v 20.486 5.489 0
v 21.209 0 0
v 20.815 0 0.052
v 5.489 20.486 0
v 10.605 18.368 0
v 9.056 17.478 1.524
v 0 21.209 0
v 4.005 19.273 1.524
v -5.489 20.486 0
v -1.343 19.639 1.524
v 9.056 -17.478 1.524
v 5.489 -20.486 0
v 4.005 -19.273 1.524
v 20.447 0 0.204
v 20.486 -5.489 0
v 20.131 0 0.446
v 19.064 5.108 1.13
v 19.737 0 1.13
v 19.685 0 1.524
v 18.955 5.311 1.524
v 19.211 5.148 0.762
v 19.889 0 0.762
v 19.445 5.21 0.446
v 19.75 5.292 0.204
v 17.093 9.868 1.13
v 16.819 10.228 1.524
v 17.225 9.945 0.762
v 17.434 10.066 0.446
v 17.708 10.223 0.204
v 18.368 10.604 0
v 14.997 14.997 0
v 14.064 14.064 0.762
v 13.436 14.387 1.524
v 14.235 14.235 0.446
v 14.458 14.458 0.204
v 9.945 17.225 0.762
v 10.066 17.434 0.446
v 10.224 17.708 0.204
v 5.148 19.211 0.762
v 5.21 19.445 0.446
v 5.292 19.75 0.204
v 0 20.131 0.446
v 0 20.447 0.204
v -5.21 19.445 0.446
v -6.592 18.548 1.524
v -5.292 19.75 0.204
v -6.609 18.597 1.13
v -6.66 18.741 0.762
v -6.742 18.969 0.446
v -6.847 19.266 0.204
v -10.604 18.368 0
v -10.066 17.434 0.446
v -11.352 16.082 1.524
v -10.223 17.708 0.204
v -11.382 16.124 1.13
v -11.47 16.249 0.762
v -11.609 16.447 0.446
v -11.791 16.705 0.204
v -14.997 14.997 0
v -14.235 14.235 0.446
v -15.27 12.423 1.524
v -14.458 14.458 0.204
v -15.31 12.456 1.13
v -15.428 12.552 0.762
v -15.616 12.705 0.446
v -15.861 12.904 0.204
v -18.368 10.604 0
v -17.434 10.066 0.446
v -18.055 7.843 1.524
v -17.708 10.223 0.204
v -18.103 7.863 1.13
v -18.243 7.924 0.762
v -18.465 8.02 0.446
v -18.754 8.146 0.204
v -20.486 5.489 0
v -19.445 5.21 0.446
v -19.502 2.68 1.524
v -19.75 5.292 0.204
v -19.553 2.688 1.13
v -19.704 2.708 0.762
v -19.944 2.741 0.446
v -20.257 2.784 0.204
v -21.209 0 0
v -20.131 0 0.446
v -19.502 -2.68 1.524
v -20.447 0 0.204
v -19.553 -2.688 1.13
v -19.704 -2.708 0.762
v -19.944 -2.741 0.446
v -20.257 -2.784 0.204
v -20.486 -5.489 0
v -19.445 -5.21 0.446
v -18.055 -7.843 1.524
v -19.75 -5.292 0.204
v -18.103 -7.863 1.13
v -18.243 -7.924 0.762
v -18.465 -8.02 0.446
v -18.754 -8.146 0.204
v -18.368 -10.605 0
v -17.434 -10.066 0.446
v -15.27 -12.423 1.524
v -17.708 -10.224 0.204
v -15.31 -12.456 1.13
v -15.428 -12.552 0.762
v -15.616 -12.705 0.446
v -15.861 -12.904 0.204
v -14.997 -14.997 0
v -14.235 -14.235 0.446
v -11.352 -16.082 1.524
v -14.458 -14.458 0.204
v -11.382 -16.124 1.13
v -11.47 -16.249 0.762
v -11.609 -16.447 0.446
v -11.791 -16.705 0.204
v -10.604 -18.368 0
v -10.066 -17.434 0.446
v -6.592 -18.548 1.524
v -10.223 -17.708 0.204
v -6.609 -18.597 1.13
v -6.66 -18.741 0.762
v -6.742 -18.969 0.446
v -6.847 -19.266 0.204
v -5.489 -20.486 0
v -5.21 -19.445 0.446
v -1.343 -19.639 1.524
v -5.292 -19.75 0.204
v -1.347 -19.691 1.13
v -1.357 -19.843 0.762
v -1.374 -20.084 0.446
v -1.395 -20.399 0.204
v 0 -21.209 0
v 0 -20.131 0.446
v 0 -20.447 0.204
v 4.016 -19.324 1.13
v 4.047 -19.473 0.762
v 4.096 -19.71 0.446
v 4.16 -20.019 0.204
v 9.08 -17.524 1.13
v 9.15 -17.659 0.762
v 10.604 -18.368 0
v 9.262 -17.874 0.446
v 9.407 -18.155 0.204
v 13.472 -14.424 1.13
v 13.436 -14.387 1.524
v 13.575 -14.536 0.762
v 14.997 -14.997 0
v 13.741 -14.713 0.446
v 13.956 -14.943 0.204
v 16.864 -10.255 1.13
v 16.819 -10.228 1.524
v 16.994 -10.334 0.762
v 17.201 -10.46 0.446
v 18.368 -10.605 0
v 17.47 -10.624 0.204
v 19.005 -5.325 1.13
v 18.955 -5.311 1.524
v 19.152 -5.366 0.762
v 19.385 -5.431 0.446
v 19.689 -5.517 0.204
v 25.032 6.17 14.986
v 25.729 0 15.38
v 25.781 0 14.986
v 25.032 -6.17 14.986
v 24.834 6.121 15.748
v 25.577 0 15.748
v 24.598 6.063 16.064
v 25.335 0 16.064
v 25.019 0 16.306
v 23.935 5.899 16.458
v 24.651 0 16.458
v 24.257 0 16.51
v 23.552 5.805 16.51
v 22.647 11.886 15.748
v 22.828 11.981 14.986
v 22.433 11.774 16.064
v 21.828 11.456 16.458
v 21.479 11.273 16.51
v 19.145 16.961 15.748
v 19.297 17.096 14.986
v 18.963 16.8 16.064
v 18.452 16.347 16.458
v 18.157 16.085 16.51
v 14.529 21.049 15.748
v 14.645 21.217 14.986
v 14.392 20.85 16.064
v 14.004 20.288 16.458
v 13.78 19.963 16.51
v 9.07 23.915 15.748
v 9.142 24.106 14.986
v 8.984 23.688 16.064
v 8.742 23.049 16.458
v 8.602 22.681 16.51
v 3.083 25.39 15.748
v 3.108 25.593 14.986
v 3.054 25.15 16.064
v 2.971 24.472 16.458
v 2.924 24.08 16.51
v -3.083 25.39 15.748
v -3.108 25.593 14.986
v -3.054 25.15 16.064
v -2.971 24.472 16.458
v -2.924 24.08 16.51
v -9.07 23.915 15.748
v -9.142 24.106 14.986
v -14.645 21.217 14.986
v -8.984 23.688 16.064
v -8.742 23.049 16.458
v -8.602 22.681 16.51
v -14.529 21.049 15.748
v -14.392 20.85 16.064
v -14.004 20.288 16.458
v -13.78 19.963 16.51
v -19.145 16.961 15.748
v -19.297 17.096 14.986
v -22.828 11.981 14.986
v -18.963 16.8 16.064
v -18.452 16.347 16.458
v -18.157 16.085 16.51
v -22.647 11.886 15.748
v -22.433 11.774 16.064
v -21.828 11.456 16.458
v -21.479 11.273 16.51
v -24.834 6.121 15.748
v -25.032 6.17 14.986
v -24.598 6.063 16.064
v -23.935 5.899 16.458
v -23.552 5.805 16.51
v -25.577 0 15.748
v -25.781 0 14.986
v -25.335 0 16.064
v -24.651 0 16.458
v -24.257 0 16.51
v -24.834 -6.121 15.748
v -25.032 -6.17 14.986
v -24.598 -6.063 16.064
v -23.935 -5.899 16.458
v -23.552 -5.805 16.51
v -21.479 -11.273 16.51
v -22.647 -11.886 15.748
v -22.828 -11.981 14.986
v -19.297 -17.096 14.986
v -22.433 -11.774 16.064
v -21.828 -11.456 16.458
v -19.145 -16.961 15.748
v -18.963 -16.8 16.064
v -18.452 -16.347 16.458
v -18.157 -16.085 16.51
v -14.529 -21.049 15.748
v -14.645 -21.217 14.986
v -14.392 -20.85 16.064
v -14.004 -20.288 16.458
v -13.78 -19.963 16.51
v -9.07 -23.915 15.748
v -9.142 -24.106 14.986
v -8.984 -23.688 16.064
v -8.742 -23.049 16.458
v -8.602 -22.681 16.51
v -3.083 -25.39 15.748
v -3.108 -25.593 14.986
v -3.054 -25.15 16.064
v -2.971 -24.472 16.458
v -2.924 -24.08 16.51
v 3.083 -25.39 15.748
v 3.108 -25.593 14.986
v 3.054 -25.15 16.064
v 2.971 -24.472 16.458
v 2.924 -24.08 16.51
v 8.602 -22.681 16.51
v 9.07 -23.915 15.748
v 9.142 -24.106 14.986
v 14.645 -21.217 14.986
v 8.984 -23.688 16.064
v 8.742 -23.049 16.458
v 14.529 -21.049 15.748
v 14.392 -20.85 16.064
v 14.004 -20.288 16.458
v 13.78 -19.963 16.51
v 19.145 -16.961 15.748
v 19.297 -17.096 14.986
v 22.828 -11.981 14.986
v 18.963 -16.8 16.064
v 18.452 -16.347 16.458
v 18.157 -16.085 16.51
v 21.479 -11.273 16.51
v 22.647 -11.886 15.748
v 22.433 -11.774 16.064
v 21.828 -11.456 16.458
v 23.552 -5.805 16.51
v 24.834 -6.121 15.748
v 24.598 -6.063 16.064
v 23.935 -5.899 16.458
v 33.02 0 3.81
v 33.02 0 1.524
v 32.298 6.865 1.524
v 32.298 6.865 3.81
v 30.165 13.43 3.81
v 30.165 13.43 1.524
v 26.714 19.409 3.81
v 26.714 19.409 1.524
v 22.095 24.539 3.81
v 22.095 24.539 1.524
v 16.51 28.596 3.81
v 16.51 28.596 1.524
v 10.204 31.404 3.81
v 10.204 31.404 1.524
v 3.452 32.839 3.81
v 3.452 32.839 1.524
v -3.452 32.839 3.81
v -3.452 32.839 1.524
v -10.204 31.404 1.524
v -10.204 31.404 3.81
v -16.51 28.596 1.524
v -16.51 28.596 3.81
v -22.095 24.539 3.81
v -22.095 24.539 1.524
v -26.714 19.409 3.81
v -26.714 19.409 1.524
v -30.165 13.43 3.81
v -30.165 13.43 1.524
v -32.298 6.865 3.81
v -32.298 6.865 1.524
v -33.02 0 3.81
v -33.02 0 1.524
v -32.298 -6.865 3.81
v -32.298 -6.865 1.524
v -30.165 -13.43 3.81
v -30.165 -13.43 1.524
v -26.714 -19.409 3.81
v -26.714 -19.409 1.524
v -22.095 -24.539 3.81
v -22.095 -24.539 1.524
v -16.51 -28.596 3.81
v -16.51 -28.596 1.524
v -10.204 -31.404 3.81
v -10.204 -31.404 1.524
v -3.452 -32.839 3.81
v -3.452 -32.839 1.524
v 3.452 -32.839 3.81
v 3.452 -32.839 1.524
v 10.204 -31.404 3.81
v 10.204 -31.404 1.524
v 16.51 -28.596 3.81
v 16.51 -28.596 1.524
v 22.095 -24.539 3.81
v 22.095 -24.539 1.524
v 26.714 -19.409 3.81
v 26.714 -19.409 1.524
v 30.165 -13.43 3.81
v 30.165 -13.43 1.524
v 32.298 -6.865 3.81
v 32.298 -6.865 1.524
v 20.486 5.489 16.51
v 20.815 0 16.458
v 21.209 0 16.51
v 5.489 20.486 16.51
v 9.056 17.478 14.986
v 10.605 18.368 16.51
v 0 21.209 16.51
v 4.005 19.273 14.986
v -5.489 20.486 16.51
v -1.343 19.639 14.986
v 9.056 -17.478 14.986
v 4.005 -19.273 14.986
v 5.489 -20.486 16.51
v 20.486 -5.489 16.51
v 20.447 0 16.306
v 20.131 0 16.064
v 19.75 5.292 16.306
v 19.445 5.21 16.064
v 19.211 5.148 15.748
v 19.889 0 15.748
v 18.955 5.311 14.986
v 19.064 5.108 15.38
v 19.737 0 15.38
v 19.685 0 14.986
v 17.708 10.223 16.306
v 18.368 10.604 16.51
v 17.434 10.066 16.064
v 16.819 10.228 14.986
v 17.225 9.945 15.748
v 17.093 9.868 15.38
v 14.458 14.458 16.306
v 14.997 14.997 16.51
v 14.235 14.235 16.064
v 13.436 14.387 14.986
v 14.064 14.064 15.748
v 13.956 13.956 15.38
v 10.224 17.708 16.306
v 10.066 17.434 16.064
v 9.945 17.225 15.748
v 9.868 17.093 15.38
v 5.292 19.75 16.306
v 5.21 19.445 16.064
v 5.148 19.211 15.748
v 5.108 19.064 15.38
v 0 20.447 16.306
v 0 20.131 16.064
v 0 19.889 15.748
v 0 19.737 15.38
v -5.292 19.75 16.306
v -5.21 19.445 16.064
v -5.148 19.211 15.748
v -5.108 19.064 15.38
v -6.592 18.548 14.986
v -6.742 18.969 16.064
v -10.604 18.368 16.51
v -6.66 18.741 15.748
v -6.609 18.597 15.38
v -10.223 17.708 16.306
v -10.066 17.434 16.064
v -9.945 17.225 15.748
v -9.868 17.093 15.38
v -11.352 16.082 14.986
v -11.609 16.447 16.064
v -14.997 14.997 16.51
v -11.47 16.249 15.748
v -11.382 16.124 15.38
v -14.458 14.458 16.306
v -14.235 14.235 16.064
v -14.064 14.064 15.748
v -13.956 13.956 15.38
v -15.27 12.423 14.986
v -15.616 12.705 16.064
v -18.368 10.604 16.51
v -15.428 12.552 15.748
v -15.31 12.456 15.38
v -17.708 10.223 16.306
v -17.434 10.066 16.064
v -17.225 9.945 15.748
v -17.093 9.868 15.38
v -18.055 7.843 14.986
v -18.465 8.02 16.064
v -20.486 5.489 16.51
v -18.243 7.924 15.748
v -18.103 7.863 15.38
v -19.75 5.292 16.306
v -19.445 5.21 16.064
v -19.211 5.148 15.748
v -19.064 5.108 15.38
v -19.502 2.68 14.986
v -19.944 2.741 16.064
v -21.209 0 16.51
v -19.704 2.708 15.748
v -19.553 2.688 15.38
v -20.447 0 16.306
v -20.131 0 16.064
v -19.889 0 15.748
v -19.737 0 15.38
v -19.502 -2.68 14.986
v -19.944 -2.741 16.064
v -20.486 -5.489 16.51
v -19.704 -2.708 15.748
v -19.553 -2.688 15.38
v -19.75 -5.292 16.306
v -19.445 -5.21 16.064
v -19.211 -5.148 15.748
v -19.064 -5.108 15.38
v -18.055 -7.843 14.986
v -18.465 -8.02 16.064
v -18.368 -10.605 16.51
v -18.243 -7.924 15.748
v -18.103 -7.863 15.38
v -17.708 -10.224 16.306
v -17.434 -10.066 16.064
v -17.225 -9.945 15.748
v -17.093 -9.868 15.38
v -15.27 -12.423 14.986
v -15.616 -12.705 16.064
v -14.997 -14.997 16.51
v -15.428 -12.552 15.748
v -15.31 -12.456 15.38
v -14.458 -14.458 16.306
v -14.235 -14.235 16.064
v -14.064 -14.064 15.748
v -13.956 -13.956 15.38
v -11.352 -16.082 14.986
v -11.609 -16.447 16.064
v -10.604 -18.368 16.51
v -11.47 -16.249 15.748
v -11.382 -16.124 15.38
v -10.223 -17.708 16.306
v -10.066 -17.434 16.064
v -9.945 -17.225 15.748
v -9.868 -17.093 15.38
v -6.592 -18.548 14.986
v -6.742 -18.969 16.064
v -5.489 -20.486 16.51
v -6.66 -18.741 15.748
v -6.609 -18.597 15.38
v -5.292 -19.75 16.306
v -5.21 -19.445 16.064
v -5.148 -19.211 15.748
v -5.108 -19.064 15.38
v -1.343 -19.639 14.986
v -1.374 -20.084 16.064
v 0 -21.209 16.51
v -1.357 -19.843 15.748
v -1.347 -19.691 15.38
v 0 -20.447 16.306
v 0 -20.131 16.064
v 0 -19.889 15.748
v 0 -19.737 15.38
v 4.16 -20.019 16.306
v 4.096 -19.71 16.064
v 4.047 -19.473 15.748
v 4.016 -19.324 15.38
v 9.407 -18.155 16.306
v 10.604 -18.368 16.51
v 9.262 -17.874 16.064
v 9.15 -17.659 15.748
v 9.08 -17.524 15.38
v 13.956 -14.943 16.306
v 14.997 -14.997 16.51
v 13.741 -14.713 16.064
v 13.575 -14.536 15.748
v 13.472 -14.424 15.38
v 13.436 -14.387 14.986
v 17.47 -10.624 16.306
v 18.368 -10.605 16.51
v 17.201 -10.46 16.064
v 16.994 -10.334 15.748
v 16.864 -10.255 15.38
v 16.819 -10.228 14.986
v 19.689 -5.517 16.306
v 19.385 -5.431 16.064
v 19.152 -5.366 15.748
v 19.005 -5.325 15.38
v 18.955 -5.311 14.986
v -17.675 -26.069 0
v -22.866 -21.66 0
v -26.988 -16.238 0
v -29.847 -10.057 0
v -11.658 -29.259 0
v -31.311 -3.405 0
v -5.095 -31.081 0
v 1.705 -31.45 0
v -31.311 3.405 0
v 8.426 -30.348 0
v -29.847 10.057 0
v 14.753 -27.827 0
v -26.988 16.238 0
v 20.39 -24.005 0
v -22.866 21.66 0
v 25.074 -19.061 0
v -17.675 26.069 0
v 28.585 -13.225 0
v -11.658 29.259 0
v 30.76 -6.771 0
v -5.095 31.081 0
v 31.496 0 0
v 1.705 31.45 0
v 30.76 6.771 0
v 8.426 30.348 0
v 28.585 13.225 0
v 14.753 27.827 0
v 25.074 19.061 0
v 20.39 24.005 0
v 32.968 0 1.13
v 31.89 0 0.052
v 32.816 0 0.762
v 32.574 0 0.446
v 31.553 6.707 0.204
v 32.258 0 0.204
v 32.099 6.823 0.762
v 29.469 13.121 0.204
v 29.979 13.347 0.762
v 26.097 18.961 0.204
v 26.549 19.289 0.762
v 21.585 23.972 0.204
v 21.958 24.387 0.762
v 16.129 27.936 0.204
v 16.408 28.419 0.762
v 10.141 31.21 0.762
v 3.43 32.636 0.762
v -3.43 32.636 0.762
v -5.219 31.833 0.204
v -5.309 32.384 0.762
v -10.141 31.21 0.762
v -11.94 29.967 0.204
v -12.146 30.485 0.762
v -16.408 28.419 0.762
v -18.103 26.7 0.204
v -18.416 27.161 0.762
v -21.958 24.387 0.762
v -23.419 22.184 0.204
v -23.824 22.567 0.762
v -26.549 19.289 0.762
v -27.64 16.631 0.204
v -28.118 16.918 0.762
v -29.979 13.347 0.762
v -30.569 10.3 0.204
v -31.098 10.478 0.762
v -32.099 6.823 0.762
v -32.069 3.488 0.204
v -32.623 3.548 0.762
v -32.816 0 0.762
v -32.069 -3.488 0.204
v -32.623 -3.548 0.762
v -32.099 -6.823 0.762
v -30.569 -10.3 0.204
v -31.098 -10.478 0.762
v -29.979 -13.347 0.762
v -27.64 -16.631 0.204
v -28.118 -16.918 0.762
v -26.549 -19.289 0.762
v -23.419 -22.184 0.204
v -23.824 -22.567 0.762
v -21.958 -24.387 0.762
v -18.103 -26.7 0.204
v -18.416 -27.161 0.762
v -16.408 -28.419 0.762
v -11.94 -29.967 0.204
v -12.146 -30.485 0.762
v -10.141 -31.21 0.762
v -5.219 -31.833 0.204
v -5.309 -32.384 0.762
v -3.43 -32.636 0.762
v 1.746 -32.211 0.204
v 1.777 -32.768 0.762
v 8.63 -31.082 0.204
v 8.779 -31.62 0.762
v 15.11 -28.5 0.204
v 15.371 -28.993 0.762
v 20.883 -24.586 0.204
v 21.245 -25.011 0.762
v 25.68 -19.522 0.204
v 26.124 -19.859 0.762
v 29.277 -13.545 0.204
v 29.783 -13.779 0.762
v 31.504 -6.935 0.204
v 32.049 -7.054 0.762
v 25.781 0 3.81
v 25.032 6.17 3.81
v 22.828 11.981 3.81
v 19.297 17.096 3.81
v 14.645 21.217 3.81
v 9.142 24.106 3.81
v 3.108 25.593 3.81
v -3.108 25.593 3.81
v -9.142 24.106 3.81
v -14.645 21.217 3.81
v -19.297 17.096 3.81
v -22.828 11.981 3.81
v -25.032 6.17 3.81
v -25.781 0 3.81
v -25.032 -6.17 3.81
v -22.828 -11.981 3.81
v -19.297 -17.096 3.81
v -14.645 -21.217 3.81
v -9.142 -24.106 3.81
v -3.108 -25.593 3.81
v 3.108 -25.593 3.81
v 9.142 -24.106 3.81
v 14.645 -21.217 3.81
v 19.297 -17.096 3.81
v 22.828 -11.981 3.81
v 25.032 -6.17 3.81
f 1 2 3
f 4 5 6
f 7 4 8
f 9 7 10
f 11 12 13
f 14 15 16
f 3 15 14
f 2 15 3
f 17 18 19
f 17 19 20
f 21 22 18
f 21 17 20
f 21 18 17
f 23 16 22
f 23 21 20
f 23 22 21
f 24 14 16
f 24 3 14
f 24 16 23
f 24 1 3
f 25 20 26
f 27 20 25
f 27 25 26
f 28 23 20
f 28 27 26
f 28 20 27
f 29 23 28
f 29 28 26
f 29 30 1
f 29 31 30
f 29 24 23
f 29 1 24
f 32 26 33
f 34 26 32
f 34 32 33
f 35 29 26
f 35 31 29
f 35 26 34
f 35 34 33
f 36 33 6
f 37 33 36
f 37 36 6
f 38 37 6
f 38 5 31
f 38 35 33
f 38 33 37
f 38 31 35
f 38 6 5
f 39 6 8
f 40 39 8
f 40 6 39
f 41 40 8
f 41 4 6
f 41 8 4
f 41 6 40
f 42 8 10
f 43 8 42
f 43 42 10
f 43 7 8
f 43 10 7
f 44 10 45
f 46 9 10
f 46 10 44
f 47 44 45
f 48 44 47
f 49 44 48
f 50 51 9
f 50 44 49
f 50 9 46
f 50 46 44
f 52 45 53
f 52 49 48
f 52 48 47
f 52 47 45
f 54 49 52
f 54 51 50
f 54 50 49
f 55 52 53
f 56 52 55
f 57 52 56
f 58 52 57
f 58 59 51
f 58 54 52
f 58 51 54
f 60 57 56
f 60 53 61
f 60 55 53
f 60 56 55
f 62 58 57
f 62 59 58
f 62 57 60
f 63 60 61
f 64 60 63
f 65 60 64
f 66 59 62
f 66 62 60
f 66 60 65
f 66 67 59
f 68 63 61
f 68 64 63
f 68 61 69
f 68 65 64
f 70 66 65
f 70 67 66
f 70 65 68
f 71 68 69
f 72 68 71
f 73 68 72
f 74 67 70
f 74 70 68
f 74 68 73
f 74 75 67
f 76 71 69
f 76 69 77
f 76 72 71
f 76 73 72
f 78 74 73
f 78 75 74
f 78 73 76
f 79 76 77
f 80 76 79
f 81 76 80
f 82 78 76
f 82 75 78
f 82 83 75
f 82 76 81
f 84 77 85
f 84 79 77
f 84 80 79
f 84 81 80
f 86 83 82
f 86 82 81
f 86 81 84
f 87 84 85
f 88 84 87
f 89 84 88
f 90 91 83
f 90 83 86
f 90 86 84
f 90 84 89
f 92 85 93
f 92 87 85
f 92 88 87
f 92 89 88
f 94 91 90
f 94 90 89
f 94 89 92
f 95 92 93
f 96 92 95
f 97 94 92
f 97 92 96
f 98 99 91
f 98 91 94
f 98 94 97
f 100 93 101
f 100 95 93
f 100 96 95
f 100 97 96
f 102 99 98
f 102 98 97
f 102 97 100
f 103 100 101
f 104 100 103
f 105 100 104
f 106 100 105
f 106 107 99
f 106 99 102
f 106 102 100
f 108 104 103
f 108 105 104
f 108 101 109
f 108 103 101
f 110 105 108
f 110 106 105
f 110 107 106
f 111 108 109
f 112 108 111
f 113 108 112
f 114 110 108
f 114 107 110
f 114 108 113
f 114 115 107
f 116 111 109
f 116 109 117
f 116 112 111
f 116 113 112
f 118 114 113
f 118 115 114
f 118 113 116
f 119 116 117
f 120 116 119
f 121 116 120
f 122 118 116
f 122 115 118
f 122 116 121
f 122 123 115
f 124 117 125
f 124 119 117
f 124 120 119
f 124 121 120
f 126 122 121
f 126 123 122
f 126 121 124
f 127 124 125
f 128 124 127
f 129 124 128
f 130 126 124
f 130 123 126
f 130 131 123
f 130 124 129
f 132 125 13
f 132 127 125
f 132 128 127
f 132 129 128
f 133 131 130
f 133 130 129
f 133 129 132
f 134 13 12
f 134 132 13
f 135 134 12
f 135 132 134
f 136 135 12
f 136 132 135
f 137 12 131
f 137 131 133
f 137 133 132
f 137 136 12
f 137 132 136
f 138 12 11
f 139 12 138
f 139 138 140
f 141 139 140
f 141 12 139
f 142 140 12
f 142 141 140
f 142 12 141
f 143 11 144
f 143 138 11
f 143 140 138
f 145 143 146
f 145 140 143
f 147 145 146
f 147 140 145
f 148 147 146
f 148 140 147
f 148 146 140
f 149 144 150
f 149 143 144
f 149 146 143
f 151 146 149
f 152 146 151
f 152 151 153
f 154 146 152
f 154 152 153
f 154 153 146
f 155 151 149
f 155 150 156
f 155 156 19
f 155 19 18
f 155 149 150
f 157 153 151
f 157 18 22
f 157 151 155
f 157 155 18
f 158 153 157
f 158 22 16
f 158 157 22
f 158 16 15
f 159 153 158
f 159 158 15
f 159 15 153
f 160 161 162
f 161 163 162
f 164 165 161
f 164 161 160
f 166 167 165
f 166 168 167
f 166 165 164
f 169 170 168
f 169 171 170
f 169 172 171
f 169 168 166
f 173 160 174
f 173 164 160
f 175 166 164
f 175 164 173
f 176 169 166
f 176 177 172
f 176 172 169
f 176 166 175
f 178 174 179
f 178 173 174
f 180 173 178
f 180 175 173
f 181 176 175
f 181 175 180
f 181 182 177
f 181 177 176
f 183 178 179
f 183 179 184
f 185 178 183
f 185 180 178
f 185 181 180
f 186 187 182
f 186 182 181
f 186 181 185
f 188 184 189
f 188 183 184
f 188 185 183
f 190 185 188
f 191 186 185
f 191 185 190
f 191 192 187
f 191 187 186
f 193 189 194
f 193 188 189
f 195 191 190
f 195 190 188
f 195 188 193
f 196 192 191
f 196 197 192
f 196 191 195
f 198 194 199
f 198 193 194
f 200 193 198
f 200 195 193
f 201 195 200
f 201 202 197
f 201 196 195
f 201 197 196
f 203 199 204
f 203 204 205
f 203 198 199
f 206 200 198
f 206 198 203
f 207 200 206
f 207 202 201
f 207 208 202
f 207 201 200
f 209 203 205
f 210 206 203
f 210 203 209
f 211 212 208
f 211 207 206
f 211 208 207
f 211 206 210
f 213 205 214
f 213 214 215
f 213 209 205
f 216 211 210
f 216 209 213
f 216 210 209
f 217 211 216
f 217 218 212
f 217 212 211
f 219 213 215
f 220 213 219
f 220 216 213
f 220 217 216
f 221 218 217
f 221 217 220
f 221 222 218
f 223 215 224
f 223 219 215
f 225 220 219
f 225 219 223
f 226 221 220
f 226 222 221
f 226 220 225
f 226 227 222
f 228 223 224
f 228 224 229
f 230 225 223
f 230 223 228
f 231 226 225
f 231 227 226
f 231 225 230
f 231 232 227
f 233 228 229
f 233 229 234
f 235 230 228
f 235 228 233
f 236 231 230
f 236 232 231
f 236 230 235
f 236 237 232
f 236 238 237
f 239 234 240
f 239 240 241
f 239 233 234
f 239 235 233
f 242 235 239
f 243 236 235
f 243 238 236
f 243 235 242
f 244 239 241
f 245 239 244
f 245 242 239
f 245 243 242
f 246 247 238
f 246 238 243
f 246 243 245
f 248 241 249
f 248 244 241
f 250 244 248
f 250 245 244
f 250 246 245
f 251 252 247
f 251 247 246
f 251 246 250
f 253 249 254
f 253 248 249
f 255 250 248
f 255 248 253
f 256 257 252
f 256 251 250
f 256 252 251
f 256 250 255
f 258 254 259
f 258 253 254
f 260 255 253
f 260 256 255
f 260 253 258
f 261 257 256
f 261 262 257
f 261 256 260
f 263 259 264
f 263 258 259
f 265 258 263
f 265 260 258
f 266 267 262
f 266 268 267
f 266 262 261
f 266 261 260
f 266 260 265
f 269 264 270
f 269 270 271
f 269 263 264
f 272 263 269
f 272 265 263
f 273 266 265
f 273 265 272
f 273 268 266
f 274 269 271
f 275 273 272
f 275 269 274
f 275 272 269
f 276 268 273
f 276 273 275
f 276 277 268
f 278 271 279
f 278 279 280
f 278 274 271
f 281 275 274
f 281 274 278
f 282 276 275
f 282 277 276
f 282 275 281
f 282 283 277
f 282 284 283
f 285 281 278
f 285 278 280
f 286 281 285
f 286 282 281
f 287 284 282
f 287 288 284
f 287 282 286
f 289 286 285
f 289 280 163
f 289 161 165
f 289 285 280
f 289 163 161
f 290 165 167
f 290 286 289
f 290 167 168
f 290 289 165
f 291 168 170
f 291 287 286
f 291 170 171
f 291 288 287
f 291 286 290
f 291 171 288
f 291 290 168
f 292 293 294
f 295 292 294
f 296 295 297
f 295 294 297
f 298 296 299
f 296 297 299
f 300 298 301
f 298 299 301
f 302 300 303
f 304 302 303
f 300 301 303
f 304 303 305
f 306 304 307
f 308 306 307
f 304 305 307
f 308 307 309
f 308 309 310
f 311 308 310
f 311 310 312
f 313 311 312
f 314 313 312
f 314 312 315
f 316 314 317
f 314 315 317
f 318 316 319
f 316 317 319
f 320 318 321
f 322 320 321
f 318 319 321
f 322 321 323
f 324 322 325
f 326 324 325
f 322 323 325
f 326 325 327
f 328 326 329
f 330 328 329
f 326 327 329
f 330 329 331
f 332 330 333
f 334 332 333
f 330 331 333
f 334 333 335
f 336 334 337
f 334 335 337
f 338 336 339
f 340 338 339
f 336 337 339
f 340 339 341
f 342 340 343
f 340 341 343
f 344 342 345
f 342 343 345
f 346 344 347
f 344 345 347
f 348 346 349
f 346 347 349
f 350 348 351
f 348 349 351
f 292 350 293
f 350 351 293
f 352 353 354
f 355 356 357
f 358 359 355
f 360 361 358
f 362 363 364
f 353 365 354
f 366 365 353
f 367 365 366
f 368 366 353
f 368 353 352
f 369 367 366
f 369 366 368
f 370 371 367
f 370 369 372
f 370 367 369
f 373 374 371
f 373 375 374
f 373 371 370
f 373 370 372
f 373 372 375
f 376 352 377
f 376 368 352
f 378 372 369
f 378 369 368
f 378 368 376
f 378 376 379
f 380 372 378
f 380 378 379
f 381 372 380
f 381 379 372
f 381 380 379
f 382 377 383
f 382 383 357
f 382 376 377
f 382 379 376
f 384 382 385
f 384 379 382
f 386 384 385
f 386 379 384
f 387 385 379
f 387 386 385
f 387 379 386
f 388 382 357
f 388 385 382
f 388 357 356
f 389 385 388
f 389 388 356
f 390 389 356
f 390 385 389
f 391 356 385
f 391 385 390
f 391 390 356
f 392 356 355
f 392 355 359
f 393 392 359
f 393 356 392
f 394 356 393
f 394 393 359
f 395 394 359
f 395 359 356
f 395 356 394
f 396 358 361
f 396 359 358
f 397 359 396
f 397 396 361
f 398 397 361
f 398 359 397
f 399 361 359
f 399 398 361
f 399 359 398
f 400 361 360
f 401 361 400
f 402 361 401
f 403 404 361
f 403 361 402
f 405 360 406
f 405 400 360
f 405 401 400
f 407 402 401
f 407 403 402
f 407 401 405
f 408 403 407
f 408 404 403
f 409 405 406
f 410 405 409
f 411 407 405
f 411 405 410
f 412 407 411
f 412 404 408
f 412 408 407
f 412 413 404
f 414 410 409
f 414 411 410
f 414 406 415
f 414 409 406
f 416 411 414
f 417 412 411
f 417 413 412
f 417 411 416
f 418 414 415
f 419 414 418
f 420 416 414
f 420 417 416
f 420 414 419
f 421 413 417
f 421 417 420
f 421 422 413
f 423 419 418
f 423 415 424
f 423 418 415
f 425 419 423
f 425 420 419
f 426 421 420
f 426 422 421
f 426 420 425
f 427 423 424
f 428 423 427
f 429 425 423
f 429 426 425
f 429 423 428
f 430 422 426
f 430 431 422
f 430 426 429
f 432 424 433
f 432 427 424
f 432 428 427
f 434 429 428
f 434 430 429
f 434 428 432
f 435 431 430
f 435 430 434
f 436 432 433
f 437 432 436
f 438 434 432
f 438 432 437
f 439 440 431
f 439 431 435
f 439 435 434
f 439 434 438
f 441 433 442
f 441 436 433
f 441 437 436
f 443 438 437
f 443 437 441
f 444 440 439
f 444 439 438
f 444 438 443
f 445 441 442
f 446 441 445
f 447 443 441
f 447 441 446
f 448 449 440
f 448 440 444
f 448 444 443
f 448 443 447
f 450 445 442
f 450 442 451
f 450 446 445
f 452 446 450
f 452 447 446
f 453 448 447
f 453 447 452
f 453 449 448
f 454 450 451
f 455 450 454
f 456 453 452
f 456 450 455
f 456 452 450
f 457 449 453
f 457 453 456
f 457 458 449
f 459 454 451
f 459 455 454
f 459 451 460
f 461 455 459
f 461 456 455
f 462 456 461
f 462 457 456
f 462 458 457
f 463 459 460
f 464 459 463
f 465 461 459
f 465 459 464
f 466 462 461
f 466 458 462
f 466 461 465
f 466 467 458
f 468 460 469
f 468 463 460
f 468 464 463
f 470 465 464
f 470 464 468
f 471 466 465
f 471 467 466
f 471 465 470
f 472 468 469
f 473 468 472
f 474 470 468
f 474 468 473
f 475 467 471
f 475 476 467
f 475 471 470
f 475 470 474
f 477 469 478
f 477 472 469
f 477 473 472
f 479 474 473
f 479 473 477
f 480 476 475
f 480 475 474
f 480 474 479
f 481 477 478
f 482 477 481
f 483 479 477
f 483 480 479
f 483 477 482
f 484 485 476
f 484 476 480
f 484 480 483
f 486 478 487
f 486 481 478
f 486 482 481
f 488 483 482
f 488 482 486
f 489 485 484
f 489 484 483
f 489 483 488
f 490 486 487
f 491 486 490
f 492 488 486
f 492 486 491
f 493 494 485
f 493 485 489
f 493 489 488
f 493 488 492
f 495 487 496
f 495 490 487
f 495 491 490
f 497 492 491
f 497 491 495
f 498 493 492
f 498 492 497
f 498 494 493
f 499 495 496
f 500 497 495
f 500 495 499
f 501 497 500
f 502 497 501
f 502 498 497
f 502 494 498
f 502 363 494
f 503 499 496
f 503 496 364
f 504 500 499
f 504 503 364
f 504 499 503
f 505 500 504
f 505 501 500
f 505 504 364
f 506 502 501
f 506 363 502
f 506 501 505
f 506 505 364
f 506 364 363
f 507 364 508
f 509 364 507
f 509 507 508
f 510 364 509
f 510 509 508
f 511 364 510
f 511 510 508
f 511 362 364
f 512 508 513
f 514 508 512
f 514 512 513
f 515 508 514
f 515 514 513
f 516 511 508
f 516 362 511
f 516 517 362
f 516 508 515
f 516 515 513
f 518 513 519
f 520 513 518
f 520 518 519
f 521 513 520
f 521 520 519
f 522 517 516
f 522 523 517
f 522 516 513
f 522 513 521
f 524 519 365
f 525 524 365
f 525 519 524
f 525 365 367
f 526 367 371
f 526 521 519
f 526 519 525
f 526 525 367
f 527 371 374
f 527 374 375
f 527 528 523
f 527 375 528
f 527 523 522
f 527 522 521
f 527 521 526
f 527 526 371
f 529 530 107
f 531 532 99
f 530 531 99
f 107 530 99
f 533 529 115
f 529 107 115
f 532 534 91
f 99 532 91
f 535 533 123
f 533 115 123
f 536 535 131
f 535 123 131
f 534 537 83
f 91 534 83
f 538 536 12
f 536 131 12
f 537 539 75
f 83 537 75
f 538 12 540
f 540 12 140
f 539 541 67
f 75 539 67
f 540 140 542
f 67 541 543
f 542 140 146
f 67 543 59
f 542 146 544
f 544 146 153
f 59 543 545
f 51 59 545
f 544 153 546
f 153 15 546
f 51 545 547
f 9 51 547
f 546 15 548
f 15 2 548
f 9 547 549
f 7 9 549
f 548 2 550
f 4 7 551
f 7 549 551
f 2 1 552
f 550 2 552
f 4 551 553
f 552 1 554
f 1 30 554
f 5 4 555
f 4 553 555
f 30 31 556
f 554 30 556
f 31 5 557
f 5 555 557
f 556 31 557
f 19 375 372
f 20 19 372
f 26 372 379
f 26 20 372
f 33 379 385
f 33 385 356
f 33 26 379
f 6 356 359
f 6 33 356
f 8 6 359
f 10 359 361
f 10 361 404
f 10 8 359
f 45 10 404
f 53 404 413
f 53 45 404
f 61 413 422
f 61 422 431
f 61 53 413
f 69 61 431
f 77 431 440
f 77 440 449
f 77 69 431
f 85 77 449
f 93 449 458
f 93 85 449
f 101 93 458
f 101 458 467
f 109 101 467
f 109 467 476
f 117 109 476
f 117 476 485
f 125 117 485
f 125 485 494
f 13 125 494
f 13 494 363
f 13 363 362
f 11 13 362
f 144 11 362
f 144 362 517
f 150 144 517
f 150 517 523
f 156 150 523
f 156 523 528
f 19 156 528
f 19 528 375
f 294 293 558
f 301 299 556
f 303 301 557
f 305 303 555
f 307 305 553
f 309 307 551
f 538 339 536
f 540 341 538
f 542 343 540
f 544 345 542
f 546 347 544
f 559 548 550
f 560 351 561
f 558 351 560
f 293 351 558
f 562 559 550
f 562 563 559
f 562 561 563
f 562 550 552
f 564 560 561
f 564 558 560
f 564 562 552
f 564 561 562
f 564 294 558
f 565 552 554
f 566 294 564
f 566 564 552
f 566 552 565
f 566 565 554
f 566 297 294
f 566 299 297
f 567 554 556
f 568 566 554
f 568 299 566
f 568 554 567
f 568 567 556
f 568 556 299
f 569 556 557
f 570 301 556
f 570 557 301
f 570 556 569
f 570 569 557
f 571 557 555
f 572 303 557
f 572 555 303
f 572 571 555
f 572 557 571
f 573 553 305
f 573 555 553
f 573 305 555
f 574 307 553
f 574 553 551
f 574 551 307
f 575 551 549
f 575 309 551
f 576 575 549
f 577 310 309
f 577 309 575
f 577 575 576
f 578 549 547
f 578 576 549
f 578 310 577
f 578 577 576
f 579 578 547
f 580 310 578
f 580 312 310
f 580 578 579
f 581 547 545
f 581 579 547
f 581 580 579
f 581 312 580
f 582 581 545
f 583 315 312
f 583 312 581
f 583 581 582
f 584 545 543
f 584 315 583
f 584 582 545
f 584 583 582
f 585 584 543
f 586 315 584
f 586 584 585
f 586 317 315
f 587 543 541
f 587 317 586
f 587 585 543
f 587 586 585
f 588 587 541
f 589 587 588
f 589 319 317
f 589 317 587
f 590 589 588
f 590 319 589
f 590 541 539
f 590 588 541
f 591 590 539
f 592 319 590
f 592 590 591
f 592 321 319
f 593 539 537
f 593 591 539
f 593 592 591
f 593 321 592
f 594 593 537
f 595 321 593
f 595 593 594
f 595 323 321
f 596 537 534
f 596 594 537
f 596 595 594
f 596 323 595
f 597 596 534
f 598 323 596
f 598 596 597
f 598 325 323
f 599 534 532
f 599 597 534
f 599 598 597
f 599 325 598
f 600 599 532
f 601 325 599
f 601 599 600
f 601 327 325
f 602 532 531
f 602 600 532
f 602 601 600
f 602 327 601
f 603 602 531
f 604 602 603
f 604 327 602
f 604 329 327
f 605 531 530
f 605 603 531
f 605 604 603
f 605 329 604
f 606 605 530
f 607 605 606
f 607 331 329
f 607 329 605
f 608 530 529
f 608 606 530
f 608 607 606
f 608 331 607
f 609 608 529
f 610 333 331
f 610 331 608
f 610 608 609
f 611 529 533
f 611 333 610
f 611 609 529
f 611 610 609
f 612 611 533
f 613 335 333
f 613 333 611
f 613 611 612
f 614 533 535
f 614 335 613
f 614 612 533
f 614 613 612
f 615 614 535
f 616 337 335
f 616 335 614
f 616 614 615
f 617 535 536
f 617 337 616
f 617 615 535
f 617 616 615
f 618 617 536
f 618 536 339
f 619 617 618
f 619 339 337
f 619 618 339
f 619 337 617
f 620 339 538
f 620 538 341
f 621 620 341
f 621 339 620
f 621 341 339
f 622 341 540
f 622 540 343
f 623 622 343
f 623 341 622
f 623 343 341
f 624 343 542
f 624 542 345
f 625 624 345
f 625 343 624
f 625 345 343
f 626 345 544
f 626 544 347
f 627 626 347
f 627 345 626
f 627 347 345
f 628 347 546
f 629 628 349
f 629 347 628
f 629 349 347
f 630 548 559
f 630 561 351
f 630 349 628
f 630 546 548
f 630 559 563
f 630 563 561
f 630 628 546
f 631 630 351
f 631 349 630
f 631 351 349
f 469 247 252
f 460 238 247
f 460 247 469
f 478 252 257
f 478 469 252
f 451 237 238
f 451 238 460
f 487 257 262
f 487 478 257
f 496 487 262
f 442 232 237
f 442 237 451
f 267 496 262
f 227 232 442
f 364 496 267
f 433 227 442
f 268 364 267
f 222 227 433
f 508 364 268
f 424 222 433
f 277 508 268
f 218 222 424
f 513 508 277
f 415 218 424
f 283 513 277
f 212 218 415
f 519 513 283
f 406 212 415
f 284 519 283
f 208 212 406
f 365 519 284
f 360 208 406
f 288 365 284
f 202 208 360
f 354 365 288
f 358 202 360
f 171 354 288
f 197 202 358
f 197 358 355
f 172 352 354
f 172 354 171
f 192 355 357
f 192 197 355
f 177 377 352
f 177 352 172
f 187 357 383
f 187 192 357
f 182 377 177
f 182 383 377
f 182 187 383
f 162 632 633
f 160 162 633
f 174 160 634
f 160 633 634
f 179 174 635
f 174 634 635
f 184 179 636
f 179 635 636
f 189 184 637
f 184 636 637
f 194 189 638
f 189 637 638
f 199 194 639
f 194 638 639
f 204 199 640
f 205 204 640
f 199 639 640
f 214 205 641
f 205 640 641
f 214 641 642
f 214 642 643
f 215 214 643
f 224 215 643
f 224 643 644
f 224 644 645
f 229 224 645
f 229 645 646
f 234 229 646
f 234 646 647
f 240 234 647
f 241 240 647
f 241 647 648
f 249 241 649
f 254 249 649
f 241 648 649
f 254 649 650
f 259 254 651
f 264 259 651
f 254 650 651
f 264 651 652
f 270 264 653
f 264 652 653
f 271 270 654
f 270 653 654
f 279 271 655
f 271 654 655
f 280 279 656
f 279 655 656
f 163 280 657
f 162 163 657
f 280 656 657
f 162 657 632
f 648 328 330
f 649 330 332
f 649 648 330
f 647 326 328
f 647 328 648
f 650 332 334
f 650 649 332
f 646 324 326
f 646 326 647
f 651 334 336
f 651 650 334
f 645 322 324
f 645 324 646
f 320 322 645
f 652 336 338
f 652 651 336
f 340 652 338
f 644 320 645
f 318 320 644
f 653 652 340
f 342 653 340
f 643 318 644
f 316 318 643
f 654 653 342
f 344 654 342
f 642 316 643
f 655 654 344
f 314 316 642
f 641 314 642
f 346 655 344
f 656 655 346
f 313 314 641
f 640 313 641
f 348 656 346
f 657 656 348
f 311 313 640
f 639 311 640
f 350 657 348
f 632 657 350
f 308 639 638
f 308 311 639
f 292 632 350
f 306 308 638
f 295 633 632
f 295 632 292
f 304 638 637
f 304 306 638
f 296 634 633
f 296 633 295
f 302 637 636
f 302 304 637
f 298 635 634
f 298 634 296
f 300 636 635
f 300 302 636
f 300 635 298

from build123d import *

# Parameters (mm, degrees)
F0_R     = 33.02
F0_R_2   = 19.685
F1_DEPTH = 3.81
F2_R     = 25.781
F2_R_2   = 19.685
F3_DEPTH = 12.7
F4_R     = 1.524


with BuildPart() as f1:
    # F0 (on Top) → F1 (new body)
    with BuildSketch(Plane.XY):
        Circle(F0_R)
        Circle(F0_R_2, mode=Mode.SUBTRACT)
    extrude(amount=F1_DEPTH)

    # F2 (on face) → F3 (join)
    with BuildSketch(Plane.XY.offset(3.81)):
        Circle(F2_R)
        Circle(F2_R_2, mode=Mode.SUBTRACT)
    extrude(amount=F3_DEPTH)

    # F4
    f4_edges = [f1.edges().sort_by_distance(p)[0] for p in [
        (-33.02, 0, 0),
        (-19.685, 0, 0),
        (-25.781, 0, 16.51),
        (-19.685, 0, 16.51),
    ]]
    fillet(f4_edges, radius=F4_R)


solid = f1.part
